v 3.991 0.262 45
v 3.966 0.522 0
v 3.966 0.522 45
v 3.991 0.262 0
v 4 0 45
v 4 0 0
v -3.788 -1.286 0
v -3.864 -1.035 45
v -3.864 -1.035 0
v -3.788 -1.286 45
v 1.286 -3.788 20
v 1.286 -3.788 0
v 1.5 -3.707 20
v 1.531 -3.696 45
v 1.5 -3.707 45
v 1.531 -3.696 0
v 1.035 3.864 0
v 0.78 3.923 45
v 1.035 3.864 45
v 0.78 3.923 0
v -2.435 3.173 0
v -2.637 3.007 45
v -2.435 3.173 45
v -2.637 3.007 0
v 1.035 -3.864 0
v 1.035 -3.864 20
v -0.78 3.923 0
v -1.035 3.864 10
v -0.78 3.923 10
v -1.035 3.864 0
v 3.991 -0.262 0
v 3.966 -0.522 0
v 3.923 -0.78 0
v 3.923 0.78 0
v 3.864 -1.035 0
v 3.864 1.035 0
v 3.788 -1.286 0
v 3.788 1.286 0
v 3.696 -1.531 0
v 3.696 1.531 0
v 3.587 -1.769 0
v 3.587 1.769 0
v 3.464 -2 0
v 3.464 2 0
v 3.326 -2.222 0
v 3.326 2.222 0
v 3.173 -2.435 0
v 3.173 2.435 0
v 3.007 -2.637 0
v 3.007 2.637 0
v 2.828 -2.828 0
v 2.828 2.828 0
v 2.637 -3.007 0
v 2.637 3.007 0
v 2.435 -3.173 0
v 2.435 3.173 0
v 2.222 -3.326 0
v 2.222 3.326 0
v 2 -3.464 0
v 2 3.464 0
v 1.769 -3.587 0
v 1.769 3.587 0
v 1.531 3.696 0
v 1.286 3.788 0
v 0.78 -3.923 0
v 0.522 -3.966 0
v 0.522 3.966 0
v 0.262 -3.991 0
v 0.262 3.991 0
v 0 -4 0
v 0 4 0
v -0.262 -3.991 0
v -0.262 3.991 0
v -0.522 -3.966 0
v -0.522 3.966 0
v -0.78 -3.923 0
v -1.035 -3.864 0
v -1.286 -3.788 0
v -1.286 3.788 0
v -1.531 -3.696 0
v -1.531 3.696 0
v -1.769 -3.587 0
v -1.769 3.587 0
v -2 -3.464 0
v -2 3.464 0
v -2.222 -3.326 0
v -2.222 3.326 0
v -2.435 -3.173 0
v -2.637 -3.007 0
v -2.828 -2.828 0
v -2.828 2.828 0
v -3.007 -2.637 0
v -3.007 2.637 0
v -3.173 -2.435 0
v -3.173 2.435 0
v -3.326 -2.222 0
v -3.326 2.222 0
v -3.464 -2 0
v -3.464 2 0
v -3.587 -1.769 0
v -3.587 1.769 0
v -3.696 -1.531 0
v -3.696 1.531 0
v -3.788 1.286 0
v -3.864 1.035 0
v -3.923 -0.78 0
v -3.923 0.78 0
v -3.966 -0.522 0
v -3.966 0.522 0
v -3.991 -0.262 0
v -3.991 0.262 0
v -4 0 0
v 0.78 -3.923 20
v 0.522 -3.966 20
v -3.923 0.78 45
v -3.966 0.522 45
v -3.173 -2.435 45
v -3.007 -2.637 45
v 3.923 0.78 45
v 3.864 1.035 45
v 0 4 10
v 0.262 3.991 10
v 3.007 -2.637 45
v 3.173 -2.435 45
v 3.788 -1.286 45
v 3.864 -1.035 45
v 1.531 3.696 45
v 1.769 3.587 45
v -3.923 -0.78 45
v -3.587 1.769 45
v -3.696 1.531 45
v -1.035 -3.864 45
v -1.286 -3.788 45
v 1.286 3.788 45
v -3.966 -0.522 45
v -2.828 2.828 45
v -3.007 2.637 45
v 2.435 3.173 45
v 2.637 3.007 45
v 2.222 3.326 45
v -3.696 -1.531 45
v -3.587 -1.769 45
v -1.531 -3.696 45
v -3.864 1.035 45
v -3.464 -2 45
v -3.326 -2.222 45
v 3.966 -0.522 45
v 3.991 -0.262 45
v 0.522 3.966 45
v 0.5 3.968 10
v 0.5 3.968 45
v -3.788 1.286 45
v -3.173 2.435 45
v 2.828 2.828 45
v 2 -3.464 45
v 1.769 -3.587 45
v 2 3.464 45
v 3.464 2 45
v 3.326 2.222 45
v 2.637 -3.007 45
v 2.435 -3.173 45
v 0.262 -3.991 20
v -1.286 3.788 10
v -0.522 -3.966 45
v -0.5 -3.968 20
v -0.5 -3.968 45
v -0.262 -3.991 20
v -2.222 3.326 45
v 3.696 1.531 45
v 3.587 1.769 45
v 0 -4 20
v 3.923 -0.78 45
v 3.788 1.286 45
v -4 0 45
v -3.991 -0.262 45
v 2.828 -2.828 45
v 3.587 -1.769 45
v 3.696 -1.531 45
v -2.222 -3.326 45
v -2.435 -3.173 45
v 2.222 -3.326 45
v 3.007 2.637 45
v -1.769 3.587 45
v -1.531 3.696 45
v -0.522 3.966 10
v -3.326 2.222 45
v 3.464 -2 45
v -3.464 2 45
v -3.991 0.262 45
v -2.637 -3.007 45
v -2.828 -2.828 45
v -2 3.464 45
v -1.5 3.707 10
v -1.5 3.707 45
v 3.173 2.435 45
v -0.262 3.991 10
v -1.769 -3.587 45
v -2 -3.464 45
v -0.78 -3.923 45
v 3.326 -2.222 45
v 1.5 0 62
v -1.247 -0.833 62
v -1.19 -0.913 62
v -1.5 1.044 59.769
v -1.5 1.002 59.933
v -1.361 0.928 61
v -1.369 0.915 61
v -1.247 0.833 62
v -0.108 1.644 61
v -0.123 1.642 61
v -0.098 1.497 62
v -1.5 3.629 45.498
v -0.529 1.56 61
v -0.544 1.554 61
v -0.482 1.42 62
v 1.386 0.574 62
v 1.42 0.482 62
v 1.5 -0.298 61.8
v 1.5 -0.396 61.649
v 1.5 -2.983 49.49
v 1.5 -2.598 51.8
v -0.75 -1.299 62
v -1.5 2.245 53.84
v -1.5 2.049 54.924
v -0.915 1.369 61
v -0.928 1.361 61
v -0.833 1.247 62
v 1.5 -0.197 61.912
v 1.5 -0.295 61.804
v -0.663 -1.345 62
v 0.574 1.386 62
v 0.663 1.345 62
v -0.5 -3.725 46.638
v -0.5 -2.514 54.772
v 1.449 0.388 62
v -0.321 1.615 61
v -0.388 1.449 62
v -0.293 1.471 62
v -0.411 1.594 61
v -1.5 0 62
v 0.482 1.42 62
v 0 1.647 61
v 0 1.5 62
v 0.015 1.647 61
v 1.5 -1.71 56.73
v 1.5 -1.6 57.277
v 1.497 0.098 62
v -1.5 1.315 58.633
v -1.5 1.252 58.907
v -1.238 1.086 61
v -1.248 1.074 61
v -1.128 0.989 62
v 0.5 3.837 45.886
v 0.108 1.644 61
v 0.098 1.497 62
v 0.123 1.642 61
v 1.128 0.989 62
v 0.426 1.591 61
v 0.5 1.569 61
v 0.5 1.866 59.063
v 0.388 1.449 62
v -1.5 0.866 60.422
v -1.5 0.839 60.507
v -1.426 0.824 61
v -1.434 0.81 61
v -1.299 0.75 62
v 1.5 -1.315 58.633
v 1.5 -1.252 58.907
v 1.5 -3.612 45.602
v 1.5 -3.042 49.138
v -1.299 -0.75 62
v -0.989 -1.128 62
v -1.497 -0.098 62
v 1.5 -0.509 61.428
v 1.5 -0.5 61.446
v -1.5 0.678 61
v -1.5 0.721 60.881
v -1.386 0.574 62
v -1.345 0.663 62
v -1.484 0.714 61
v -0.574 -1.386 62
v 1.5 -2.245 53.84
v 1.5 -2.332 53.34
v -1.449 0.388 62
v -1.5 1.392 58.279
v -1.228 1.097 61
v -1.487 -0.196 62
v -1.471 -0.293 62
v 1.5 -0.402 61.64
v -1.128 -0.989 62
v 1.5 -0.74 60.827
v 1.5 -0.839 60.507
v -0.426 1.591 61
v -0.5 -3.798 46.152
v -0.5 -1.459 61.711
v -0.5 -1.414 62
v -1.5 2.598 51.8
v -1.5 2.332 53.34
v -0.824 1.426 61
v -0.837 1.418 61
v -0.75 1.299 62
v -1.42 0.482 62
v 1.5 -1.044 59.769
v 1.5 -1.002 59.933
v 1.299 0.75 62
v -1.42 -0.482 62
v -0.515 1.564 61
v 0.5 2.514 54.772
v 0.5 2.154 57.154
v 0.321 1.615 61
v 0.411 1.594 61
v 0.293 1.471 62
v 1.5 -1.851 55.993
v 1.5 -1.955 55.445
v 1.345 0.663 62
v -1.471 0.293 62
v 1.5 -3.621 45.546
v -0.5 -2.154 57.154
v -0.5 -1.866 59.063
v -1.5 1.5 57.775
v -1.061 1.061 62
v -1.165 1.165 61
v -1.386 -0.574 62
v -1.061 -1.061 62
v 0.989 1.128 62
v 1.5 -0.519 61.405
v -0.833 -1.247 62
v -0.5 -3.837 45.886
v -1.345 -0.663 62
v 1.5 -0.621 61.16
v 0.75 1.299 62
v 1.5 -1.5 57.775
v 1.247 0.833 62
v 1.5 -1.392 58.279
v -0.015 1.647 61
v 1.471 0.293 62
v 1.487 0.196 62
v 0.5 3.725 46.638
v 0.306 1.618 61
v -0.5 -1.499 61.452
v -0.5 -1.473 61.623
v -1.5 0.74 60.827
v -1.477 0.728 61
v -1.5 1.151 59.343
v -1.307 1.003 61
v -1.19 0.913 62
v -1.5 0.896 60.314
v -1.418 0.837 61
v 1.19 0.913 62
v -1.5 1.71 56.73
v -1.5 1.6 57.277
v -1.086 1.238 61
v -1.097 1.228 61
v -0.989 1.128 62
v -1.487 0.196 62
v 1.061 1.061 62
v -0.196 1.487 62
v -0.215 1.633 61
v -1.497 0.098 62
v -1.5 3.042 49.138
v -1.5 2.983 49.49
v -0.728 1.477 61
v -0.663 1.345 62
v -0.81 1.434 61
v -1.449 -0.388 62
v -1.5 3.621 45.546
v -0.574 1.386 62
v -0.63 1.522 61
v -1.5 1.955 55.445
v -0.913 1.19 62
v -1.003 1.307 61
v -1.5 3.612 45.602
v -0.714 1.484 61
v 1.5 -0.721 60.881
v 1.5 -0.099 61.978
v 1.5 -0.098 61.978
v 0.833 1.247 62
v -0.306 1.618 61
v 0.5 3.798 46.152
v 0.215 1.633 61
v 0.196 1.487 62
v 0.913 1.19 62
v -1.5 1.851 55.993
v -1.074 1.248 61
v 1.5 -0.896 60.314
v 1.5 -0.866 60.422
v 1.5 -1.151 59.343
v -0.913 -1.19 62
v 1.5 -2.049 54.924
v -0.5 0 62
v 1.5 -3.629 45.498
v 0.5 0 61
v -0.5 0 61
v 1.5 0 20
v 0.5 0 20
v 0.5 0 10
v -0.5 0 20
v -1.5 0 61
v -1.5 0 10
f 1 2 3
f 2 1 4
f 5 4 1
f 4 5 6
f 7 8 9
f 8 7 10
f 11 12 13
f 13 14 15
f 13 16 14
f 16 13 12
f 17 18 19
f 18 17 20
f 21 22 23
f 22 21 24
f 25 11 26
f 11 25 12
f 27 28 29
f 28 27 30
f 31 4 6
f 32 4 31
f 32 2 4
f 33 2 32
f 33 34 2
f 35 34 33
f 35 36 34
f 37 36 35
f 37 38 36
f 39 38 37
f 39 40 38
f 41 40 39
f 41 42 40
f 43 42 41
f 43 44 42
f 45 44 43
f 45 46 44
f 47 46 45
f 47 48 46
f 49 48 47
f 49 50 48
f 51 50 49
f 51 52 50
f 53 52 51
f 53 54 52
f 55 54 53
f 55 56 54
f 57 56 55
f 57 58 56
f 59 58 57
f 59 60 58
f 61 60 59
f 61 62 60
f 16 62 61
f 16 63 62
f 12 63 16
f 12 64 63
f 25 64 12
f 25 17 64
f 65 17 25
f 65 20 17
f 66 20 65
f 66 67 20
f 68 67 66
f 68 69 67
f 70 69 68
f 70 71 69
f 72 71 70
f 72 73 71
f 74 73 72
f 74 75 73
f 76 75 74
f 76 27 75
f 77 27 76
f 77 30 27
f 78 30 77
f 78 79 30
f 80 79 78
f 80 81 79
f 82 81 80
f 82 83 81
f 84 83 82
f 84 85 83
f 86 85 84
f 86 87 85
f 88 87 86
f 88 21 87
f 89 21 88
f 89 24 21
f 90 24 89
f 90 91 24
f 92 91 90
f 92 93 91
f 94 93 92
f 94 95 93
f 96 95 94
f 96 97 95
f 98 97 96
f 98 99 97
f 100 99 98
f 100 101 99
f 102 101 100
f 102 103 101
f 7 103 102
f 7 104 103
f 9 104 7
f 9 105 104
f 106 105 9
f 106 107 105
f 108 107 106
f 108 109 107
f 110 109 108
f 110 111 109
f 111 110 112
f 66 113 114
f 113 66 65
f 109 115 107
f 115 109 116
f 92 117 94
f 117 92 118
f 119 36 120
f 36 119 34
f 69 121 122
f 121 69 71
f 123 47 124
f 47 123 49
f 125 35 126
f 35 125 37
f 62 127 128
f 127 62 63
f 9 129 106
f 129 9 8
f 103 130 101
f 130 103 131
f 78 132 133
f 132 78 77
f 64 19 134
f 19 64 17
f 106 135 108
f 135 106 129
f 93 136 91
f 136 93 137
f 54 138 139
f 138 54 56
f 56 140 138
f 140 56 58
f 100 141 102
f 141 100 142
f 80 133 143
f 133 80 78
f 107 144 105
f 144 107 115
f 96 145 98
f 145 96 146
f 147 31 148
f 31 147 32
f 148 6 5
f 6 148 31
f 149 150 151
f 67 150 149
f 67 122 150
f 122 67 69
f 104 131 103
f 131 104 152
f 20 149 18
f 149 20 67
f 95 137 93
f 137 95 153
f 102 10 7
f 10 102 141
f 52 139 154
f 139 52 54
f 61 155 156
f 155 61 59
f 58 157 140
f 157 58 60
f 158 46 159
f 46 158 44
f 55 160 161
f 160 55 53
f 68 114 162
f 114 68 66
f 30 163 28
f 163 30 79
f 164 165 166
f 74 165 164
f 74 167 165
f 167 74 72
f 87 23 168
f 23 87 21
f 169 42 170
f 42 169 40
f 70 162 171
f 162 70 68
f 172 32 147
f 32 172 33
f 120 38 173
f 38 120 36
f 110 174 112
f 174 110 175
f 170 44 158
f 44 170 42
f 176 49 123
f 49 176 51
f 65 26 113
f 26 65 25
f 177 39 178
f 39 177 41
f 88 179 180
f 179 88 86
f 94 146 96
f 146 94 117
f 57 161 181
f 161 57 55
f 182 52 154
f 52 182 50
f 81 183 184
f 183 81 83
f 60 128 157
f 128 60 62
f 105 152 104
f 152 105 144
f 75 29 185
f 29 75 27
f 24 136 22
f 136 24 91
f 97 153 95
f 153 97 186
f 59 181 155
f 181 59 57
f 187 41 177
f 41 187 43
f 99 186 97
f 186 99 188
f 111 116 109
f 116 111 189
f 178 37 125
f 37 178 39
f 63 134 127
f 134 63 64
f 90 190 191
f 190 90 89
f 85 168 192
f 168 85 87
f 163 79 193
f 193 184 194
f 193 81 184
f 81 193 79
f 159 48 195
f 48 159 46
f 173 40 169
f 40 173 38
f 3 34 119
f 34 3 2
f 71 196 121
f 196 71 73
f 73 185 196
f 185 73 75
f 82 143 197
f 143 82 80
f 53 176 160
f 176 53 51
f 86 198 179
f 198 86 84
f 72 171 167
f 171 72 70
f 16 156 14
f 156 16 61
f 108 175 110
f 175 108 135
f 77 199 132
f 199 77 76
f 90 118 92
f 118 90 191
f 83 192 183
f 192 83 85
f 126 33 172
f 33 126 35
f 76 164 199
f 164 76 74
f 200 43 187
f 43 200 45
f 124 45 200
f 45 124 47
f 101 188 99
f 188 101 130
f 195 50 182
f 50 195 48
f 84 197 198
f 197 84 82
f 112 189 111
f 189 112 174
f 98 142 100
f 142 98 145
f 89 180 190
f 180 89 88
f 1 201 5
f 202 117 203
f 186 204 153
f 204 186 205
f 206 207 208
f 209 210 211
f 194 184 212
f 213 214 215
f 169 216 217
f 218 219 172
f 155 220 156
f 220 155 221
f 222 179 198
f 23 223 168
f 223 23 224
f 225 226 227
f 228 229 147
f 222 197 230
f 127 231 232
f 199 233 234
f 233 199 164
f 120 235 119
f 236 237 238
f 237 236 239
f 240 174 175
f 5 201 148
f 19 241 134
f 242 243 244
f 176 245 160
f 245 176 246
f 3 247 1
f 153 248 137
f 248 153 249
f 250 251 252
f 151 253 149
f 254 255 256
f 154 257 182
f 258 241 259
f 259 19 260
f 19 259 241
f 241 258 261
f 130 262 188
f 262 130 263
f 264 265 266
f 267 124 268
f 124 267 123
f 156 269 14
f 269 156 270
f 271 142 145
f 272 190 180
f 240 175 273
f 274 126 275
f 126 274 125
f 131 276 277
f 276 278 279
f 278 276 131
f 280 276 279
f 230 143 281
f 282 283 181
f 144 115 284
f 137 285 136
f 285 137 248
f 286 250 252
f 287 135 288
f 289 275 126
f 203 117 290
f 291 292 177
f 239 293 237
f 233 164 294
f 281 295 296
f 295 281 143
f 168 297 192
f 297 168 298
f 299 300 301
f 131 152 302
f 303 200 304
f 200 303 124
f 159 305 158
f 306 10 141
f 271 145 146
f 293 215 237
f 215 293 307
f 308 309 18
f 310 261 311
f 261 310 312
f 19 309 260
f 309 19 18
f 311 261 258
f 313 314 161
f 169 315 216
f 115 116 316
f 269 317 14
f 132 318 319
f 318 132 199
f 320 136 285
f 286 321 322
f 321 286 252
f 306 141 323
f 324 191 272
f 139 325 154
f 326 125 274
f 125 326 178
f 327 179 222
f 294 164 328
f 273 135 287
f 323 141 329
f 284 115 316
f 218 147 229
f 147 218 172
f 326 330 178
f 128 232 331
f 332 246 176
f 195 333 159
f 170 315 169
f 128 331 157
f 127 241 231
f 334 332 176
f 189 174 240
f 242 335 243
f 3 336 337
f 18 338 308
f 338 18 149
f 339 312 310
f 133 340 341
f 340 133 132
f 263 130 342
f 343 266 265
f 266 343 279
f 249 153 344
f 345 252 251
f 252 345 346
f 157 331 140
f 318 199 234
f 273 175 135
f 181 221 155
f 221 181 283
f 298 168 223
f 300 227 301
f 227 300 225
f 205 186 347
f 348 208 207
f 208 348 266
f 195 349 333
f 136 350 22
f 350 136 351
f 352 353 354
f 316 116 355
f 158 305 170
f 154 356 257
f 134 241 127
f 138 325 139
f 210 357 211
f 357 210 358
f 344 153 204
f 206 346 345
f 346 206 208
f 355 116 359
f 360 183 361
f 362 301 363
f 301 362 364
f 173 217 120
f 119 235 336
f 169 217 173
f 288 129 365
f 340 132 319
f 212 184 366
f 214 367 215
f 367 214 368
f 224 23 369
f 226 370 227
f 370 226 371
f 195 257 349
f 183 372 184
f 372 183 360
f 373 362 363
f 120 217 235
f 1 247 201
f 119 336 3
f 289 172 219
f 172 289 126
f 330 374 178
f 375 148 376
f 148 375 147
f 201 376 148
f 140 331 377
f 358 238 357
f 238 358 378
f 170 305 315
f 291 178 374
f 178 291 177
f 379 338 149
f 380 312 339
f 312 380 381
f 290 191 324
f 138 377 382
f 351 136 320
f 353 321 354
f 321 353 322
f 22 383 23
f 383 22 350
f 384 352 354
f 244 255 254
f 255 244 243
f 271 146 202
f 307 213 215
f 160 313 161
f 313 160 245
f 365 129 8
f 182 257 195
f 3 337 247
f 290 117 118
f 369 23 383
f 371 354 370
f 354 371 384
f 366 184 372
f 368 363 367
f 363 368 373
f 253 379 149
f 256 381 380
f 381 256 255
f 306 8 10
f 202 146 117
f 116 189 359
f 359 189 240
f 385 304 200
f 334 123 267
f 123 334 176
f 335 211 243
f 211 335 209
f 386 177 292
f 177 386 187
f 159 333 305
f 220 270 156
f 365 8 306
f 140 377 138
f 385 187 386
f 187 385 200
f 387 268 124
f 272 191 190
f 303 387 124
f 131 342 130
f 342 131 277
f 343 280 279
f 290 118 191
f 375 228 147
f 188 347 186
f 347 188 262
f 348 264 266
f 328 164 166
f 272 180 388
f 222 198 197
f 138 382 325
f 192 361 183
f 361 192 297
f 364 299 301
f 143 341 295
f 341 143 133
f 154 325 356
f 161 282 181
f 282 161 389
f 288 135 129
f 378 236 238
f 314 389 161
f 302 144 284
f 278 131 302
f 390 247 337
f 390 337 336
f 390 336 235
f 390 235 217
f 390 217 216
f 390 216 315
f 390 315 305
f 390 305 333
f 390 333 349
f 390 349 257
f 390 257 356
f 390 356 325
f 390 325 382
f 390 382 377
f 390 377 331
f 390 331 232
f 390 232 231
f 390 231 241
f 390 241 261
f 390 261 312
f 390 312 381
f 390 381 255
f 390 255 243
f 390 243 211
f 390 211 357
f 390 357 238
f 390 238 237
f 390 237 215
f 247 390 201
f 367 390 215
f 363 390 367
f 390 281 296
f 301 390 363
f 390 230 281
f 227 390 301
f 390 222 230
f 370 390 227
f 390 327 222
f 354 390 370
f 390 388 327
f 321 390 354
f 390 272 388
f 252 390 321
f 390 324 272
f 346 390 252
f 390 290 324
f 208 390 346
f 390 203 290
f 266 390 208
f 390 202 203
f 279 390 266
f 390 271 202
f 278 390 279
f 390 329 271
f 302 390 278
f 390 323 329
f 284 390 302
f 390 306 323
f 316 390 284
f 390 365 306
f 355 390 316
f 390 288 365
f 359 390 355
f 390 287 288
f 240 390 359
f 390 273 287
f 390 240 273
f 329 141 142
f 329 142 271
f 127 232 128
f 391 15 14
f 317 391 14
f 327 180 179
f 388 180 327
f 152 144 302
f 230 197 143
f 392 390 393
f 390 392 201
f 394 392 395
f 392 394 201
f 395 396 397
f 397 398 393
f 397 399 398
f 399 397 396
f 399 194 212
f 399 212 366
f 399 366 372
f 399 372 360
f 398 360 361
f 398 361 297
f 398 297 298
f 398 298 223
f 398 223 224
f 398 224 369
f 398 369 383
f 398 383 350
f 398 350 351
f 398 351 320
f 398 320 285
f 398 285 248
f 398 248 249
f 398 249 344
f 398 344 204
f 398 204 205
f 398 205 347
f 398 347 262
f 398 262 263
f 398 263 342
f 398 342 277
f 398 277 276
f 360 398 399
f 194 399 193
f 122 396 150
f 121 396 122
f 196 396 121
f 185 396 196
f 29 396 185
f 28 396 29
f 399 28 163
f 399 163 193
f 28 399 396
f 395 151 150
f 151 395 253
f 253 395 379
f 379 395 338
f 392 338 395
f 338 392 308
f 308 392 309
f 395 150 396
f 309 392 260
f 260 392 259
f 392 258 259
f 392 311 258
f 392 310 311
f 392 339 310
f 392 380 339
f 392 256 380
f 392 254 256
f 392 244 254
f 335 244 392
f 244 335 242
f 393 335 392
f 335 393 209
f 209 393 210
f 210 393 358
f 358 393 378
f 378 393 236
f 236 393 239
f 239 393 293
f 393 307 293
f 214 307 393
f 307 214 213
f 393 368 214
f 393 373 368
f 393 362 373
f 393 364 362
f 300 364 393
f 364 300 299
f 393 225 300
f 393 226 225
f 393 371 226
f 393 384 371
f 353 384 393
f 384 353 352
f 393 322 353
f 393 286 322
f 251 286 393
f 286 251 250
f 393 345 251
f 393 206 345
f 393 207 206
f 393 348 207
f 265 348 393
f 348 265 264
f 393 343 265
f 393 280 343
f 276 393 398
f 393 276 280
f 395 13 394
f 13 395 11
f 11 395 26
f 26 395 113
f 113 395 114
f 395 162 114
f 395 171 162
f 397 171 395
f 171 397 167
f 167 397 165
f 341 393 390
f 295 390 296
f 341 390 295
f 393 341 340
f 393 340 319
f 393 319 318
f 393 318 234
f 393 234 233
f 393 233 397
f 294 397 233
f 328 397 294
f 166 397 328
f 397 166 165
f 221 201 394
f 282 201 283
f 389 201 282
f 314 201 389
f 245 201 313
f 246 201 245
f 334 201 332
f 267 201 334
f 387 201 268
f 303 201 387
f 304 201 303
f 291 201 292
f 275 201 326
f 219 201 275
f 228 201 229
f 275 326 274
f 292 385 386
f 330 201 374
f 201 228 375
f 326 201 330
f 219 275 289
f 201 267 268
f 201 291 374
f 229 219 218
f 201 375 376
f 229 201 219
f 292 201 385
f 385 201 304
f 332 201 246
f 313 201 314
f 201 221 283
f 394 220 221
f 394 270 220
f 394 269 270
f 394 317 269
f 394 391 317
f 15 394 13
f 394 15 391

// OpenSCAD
// Tissue-pestle for 1.5 mL microcentrifuge tubes
// Print orientation: standing upright on the bed (z = 0), centred on the origin in X and Y.
// Units: millimetres.

$fn = 96;

// ---- Dimensions ----
handle_d      = 8;    // handle diameter (also cone base diameter)
handle_h      = 45;   // handle height (z = 0 to z = 45)
cone_d        = 3;    // cone tip diameter (at z = 62)
cone_top_z    = 62;   // z where the cone meets the rounded tip
tip_d         = 3;    // rounded tip diameter (sphere)
tip_z         = 62;   // sphere centre height (z = cone_top_z)
groove_count  = 4;    // number of circumferential grooves on the handle
groove_w      = 2;    // groove width (in Z)
groove_depth  = 1;    // groove depth (in radial thickness / X)
groove_z      = [10, 15, 20, 25]; // groove centre heights
eps           = 0.5;  // overshoot for clean boolean cuts

// ---- Model ----
difference() {
    union() {
        // (1) Cylindrical handle
        cylinder(d = handle_d, h = handle_h);

        // (2) Tapering cone: 8 mm at z = 45 -> 3 mm at z = 62
        translate([0, 0, handle_h])
            cylinder(d1 = handle_d, d2 = cone_d, h = cone_top_z - handle_h);

        // (3) Rounded tip: 3 mm diameter sphere centred at z = 62
        translate([0, 0, tip_z - tip_d / 2])
            sphere(d = tip_d);
    }

    // Grip grooves, cut fully through the handle wall
    for (g = [0 : groove_count - 1]) {
        rotate([0, 0, groove_z[g] < 20 ? 90 : -90])
            translate([0, -eps, groove_z[g]])
                cube([handle_d / 2 + eps, groove_w, handle_h + 2 * eps]);
    }
}
